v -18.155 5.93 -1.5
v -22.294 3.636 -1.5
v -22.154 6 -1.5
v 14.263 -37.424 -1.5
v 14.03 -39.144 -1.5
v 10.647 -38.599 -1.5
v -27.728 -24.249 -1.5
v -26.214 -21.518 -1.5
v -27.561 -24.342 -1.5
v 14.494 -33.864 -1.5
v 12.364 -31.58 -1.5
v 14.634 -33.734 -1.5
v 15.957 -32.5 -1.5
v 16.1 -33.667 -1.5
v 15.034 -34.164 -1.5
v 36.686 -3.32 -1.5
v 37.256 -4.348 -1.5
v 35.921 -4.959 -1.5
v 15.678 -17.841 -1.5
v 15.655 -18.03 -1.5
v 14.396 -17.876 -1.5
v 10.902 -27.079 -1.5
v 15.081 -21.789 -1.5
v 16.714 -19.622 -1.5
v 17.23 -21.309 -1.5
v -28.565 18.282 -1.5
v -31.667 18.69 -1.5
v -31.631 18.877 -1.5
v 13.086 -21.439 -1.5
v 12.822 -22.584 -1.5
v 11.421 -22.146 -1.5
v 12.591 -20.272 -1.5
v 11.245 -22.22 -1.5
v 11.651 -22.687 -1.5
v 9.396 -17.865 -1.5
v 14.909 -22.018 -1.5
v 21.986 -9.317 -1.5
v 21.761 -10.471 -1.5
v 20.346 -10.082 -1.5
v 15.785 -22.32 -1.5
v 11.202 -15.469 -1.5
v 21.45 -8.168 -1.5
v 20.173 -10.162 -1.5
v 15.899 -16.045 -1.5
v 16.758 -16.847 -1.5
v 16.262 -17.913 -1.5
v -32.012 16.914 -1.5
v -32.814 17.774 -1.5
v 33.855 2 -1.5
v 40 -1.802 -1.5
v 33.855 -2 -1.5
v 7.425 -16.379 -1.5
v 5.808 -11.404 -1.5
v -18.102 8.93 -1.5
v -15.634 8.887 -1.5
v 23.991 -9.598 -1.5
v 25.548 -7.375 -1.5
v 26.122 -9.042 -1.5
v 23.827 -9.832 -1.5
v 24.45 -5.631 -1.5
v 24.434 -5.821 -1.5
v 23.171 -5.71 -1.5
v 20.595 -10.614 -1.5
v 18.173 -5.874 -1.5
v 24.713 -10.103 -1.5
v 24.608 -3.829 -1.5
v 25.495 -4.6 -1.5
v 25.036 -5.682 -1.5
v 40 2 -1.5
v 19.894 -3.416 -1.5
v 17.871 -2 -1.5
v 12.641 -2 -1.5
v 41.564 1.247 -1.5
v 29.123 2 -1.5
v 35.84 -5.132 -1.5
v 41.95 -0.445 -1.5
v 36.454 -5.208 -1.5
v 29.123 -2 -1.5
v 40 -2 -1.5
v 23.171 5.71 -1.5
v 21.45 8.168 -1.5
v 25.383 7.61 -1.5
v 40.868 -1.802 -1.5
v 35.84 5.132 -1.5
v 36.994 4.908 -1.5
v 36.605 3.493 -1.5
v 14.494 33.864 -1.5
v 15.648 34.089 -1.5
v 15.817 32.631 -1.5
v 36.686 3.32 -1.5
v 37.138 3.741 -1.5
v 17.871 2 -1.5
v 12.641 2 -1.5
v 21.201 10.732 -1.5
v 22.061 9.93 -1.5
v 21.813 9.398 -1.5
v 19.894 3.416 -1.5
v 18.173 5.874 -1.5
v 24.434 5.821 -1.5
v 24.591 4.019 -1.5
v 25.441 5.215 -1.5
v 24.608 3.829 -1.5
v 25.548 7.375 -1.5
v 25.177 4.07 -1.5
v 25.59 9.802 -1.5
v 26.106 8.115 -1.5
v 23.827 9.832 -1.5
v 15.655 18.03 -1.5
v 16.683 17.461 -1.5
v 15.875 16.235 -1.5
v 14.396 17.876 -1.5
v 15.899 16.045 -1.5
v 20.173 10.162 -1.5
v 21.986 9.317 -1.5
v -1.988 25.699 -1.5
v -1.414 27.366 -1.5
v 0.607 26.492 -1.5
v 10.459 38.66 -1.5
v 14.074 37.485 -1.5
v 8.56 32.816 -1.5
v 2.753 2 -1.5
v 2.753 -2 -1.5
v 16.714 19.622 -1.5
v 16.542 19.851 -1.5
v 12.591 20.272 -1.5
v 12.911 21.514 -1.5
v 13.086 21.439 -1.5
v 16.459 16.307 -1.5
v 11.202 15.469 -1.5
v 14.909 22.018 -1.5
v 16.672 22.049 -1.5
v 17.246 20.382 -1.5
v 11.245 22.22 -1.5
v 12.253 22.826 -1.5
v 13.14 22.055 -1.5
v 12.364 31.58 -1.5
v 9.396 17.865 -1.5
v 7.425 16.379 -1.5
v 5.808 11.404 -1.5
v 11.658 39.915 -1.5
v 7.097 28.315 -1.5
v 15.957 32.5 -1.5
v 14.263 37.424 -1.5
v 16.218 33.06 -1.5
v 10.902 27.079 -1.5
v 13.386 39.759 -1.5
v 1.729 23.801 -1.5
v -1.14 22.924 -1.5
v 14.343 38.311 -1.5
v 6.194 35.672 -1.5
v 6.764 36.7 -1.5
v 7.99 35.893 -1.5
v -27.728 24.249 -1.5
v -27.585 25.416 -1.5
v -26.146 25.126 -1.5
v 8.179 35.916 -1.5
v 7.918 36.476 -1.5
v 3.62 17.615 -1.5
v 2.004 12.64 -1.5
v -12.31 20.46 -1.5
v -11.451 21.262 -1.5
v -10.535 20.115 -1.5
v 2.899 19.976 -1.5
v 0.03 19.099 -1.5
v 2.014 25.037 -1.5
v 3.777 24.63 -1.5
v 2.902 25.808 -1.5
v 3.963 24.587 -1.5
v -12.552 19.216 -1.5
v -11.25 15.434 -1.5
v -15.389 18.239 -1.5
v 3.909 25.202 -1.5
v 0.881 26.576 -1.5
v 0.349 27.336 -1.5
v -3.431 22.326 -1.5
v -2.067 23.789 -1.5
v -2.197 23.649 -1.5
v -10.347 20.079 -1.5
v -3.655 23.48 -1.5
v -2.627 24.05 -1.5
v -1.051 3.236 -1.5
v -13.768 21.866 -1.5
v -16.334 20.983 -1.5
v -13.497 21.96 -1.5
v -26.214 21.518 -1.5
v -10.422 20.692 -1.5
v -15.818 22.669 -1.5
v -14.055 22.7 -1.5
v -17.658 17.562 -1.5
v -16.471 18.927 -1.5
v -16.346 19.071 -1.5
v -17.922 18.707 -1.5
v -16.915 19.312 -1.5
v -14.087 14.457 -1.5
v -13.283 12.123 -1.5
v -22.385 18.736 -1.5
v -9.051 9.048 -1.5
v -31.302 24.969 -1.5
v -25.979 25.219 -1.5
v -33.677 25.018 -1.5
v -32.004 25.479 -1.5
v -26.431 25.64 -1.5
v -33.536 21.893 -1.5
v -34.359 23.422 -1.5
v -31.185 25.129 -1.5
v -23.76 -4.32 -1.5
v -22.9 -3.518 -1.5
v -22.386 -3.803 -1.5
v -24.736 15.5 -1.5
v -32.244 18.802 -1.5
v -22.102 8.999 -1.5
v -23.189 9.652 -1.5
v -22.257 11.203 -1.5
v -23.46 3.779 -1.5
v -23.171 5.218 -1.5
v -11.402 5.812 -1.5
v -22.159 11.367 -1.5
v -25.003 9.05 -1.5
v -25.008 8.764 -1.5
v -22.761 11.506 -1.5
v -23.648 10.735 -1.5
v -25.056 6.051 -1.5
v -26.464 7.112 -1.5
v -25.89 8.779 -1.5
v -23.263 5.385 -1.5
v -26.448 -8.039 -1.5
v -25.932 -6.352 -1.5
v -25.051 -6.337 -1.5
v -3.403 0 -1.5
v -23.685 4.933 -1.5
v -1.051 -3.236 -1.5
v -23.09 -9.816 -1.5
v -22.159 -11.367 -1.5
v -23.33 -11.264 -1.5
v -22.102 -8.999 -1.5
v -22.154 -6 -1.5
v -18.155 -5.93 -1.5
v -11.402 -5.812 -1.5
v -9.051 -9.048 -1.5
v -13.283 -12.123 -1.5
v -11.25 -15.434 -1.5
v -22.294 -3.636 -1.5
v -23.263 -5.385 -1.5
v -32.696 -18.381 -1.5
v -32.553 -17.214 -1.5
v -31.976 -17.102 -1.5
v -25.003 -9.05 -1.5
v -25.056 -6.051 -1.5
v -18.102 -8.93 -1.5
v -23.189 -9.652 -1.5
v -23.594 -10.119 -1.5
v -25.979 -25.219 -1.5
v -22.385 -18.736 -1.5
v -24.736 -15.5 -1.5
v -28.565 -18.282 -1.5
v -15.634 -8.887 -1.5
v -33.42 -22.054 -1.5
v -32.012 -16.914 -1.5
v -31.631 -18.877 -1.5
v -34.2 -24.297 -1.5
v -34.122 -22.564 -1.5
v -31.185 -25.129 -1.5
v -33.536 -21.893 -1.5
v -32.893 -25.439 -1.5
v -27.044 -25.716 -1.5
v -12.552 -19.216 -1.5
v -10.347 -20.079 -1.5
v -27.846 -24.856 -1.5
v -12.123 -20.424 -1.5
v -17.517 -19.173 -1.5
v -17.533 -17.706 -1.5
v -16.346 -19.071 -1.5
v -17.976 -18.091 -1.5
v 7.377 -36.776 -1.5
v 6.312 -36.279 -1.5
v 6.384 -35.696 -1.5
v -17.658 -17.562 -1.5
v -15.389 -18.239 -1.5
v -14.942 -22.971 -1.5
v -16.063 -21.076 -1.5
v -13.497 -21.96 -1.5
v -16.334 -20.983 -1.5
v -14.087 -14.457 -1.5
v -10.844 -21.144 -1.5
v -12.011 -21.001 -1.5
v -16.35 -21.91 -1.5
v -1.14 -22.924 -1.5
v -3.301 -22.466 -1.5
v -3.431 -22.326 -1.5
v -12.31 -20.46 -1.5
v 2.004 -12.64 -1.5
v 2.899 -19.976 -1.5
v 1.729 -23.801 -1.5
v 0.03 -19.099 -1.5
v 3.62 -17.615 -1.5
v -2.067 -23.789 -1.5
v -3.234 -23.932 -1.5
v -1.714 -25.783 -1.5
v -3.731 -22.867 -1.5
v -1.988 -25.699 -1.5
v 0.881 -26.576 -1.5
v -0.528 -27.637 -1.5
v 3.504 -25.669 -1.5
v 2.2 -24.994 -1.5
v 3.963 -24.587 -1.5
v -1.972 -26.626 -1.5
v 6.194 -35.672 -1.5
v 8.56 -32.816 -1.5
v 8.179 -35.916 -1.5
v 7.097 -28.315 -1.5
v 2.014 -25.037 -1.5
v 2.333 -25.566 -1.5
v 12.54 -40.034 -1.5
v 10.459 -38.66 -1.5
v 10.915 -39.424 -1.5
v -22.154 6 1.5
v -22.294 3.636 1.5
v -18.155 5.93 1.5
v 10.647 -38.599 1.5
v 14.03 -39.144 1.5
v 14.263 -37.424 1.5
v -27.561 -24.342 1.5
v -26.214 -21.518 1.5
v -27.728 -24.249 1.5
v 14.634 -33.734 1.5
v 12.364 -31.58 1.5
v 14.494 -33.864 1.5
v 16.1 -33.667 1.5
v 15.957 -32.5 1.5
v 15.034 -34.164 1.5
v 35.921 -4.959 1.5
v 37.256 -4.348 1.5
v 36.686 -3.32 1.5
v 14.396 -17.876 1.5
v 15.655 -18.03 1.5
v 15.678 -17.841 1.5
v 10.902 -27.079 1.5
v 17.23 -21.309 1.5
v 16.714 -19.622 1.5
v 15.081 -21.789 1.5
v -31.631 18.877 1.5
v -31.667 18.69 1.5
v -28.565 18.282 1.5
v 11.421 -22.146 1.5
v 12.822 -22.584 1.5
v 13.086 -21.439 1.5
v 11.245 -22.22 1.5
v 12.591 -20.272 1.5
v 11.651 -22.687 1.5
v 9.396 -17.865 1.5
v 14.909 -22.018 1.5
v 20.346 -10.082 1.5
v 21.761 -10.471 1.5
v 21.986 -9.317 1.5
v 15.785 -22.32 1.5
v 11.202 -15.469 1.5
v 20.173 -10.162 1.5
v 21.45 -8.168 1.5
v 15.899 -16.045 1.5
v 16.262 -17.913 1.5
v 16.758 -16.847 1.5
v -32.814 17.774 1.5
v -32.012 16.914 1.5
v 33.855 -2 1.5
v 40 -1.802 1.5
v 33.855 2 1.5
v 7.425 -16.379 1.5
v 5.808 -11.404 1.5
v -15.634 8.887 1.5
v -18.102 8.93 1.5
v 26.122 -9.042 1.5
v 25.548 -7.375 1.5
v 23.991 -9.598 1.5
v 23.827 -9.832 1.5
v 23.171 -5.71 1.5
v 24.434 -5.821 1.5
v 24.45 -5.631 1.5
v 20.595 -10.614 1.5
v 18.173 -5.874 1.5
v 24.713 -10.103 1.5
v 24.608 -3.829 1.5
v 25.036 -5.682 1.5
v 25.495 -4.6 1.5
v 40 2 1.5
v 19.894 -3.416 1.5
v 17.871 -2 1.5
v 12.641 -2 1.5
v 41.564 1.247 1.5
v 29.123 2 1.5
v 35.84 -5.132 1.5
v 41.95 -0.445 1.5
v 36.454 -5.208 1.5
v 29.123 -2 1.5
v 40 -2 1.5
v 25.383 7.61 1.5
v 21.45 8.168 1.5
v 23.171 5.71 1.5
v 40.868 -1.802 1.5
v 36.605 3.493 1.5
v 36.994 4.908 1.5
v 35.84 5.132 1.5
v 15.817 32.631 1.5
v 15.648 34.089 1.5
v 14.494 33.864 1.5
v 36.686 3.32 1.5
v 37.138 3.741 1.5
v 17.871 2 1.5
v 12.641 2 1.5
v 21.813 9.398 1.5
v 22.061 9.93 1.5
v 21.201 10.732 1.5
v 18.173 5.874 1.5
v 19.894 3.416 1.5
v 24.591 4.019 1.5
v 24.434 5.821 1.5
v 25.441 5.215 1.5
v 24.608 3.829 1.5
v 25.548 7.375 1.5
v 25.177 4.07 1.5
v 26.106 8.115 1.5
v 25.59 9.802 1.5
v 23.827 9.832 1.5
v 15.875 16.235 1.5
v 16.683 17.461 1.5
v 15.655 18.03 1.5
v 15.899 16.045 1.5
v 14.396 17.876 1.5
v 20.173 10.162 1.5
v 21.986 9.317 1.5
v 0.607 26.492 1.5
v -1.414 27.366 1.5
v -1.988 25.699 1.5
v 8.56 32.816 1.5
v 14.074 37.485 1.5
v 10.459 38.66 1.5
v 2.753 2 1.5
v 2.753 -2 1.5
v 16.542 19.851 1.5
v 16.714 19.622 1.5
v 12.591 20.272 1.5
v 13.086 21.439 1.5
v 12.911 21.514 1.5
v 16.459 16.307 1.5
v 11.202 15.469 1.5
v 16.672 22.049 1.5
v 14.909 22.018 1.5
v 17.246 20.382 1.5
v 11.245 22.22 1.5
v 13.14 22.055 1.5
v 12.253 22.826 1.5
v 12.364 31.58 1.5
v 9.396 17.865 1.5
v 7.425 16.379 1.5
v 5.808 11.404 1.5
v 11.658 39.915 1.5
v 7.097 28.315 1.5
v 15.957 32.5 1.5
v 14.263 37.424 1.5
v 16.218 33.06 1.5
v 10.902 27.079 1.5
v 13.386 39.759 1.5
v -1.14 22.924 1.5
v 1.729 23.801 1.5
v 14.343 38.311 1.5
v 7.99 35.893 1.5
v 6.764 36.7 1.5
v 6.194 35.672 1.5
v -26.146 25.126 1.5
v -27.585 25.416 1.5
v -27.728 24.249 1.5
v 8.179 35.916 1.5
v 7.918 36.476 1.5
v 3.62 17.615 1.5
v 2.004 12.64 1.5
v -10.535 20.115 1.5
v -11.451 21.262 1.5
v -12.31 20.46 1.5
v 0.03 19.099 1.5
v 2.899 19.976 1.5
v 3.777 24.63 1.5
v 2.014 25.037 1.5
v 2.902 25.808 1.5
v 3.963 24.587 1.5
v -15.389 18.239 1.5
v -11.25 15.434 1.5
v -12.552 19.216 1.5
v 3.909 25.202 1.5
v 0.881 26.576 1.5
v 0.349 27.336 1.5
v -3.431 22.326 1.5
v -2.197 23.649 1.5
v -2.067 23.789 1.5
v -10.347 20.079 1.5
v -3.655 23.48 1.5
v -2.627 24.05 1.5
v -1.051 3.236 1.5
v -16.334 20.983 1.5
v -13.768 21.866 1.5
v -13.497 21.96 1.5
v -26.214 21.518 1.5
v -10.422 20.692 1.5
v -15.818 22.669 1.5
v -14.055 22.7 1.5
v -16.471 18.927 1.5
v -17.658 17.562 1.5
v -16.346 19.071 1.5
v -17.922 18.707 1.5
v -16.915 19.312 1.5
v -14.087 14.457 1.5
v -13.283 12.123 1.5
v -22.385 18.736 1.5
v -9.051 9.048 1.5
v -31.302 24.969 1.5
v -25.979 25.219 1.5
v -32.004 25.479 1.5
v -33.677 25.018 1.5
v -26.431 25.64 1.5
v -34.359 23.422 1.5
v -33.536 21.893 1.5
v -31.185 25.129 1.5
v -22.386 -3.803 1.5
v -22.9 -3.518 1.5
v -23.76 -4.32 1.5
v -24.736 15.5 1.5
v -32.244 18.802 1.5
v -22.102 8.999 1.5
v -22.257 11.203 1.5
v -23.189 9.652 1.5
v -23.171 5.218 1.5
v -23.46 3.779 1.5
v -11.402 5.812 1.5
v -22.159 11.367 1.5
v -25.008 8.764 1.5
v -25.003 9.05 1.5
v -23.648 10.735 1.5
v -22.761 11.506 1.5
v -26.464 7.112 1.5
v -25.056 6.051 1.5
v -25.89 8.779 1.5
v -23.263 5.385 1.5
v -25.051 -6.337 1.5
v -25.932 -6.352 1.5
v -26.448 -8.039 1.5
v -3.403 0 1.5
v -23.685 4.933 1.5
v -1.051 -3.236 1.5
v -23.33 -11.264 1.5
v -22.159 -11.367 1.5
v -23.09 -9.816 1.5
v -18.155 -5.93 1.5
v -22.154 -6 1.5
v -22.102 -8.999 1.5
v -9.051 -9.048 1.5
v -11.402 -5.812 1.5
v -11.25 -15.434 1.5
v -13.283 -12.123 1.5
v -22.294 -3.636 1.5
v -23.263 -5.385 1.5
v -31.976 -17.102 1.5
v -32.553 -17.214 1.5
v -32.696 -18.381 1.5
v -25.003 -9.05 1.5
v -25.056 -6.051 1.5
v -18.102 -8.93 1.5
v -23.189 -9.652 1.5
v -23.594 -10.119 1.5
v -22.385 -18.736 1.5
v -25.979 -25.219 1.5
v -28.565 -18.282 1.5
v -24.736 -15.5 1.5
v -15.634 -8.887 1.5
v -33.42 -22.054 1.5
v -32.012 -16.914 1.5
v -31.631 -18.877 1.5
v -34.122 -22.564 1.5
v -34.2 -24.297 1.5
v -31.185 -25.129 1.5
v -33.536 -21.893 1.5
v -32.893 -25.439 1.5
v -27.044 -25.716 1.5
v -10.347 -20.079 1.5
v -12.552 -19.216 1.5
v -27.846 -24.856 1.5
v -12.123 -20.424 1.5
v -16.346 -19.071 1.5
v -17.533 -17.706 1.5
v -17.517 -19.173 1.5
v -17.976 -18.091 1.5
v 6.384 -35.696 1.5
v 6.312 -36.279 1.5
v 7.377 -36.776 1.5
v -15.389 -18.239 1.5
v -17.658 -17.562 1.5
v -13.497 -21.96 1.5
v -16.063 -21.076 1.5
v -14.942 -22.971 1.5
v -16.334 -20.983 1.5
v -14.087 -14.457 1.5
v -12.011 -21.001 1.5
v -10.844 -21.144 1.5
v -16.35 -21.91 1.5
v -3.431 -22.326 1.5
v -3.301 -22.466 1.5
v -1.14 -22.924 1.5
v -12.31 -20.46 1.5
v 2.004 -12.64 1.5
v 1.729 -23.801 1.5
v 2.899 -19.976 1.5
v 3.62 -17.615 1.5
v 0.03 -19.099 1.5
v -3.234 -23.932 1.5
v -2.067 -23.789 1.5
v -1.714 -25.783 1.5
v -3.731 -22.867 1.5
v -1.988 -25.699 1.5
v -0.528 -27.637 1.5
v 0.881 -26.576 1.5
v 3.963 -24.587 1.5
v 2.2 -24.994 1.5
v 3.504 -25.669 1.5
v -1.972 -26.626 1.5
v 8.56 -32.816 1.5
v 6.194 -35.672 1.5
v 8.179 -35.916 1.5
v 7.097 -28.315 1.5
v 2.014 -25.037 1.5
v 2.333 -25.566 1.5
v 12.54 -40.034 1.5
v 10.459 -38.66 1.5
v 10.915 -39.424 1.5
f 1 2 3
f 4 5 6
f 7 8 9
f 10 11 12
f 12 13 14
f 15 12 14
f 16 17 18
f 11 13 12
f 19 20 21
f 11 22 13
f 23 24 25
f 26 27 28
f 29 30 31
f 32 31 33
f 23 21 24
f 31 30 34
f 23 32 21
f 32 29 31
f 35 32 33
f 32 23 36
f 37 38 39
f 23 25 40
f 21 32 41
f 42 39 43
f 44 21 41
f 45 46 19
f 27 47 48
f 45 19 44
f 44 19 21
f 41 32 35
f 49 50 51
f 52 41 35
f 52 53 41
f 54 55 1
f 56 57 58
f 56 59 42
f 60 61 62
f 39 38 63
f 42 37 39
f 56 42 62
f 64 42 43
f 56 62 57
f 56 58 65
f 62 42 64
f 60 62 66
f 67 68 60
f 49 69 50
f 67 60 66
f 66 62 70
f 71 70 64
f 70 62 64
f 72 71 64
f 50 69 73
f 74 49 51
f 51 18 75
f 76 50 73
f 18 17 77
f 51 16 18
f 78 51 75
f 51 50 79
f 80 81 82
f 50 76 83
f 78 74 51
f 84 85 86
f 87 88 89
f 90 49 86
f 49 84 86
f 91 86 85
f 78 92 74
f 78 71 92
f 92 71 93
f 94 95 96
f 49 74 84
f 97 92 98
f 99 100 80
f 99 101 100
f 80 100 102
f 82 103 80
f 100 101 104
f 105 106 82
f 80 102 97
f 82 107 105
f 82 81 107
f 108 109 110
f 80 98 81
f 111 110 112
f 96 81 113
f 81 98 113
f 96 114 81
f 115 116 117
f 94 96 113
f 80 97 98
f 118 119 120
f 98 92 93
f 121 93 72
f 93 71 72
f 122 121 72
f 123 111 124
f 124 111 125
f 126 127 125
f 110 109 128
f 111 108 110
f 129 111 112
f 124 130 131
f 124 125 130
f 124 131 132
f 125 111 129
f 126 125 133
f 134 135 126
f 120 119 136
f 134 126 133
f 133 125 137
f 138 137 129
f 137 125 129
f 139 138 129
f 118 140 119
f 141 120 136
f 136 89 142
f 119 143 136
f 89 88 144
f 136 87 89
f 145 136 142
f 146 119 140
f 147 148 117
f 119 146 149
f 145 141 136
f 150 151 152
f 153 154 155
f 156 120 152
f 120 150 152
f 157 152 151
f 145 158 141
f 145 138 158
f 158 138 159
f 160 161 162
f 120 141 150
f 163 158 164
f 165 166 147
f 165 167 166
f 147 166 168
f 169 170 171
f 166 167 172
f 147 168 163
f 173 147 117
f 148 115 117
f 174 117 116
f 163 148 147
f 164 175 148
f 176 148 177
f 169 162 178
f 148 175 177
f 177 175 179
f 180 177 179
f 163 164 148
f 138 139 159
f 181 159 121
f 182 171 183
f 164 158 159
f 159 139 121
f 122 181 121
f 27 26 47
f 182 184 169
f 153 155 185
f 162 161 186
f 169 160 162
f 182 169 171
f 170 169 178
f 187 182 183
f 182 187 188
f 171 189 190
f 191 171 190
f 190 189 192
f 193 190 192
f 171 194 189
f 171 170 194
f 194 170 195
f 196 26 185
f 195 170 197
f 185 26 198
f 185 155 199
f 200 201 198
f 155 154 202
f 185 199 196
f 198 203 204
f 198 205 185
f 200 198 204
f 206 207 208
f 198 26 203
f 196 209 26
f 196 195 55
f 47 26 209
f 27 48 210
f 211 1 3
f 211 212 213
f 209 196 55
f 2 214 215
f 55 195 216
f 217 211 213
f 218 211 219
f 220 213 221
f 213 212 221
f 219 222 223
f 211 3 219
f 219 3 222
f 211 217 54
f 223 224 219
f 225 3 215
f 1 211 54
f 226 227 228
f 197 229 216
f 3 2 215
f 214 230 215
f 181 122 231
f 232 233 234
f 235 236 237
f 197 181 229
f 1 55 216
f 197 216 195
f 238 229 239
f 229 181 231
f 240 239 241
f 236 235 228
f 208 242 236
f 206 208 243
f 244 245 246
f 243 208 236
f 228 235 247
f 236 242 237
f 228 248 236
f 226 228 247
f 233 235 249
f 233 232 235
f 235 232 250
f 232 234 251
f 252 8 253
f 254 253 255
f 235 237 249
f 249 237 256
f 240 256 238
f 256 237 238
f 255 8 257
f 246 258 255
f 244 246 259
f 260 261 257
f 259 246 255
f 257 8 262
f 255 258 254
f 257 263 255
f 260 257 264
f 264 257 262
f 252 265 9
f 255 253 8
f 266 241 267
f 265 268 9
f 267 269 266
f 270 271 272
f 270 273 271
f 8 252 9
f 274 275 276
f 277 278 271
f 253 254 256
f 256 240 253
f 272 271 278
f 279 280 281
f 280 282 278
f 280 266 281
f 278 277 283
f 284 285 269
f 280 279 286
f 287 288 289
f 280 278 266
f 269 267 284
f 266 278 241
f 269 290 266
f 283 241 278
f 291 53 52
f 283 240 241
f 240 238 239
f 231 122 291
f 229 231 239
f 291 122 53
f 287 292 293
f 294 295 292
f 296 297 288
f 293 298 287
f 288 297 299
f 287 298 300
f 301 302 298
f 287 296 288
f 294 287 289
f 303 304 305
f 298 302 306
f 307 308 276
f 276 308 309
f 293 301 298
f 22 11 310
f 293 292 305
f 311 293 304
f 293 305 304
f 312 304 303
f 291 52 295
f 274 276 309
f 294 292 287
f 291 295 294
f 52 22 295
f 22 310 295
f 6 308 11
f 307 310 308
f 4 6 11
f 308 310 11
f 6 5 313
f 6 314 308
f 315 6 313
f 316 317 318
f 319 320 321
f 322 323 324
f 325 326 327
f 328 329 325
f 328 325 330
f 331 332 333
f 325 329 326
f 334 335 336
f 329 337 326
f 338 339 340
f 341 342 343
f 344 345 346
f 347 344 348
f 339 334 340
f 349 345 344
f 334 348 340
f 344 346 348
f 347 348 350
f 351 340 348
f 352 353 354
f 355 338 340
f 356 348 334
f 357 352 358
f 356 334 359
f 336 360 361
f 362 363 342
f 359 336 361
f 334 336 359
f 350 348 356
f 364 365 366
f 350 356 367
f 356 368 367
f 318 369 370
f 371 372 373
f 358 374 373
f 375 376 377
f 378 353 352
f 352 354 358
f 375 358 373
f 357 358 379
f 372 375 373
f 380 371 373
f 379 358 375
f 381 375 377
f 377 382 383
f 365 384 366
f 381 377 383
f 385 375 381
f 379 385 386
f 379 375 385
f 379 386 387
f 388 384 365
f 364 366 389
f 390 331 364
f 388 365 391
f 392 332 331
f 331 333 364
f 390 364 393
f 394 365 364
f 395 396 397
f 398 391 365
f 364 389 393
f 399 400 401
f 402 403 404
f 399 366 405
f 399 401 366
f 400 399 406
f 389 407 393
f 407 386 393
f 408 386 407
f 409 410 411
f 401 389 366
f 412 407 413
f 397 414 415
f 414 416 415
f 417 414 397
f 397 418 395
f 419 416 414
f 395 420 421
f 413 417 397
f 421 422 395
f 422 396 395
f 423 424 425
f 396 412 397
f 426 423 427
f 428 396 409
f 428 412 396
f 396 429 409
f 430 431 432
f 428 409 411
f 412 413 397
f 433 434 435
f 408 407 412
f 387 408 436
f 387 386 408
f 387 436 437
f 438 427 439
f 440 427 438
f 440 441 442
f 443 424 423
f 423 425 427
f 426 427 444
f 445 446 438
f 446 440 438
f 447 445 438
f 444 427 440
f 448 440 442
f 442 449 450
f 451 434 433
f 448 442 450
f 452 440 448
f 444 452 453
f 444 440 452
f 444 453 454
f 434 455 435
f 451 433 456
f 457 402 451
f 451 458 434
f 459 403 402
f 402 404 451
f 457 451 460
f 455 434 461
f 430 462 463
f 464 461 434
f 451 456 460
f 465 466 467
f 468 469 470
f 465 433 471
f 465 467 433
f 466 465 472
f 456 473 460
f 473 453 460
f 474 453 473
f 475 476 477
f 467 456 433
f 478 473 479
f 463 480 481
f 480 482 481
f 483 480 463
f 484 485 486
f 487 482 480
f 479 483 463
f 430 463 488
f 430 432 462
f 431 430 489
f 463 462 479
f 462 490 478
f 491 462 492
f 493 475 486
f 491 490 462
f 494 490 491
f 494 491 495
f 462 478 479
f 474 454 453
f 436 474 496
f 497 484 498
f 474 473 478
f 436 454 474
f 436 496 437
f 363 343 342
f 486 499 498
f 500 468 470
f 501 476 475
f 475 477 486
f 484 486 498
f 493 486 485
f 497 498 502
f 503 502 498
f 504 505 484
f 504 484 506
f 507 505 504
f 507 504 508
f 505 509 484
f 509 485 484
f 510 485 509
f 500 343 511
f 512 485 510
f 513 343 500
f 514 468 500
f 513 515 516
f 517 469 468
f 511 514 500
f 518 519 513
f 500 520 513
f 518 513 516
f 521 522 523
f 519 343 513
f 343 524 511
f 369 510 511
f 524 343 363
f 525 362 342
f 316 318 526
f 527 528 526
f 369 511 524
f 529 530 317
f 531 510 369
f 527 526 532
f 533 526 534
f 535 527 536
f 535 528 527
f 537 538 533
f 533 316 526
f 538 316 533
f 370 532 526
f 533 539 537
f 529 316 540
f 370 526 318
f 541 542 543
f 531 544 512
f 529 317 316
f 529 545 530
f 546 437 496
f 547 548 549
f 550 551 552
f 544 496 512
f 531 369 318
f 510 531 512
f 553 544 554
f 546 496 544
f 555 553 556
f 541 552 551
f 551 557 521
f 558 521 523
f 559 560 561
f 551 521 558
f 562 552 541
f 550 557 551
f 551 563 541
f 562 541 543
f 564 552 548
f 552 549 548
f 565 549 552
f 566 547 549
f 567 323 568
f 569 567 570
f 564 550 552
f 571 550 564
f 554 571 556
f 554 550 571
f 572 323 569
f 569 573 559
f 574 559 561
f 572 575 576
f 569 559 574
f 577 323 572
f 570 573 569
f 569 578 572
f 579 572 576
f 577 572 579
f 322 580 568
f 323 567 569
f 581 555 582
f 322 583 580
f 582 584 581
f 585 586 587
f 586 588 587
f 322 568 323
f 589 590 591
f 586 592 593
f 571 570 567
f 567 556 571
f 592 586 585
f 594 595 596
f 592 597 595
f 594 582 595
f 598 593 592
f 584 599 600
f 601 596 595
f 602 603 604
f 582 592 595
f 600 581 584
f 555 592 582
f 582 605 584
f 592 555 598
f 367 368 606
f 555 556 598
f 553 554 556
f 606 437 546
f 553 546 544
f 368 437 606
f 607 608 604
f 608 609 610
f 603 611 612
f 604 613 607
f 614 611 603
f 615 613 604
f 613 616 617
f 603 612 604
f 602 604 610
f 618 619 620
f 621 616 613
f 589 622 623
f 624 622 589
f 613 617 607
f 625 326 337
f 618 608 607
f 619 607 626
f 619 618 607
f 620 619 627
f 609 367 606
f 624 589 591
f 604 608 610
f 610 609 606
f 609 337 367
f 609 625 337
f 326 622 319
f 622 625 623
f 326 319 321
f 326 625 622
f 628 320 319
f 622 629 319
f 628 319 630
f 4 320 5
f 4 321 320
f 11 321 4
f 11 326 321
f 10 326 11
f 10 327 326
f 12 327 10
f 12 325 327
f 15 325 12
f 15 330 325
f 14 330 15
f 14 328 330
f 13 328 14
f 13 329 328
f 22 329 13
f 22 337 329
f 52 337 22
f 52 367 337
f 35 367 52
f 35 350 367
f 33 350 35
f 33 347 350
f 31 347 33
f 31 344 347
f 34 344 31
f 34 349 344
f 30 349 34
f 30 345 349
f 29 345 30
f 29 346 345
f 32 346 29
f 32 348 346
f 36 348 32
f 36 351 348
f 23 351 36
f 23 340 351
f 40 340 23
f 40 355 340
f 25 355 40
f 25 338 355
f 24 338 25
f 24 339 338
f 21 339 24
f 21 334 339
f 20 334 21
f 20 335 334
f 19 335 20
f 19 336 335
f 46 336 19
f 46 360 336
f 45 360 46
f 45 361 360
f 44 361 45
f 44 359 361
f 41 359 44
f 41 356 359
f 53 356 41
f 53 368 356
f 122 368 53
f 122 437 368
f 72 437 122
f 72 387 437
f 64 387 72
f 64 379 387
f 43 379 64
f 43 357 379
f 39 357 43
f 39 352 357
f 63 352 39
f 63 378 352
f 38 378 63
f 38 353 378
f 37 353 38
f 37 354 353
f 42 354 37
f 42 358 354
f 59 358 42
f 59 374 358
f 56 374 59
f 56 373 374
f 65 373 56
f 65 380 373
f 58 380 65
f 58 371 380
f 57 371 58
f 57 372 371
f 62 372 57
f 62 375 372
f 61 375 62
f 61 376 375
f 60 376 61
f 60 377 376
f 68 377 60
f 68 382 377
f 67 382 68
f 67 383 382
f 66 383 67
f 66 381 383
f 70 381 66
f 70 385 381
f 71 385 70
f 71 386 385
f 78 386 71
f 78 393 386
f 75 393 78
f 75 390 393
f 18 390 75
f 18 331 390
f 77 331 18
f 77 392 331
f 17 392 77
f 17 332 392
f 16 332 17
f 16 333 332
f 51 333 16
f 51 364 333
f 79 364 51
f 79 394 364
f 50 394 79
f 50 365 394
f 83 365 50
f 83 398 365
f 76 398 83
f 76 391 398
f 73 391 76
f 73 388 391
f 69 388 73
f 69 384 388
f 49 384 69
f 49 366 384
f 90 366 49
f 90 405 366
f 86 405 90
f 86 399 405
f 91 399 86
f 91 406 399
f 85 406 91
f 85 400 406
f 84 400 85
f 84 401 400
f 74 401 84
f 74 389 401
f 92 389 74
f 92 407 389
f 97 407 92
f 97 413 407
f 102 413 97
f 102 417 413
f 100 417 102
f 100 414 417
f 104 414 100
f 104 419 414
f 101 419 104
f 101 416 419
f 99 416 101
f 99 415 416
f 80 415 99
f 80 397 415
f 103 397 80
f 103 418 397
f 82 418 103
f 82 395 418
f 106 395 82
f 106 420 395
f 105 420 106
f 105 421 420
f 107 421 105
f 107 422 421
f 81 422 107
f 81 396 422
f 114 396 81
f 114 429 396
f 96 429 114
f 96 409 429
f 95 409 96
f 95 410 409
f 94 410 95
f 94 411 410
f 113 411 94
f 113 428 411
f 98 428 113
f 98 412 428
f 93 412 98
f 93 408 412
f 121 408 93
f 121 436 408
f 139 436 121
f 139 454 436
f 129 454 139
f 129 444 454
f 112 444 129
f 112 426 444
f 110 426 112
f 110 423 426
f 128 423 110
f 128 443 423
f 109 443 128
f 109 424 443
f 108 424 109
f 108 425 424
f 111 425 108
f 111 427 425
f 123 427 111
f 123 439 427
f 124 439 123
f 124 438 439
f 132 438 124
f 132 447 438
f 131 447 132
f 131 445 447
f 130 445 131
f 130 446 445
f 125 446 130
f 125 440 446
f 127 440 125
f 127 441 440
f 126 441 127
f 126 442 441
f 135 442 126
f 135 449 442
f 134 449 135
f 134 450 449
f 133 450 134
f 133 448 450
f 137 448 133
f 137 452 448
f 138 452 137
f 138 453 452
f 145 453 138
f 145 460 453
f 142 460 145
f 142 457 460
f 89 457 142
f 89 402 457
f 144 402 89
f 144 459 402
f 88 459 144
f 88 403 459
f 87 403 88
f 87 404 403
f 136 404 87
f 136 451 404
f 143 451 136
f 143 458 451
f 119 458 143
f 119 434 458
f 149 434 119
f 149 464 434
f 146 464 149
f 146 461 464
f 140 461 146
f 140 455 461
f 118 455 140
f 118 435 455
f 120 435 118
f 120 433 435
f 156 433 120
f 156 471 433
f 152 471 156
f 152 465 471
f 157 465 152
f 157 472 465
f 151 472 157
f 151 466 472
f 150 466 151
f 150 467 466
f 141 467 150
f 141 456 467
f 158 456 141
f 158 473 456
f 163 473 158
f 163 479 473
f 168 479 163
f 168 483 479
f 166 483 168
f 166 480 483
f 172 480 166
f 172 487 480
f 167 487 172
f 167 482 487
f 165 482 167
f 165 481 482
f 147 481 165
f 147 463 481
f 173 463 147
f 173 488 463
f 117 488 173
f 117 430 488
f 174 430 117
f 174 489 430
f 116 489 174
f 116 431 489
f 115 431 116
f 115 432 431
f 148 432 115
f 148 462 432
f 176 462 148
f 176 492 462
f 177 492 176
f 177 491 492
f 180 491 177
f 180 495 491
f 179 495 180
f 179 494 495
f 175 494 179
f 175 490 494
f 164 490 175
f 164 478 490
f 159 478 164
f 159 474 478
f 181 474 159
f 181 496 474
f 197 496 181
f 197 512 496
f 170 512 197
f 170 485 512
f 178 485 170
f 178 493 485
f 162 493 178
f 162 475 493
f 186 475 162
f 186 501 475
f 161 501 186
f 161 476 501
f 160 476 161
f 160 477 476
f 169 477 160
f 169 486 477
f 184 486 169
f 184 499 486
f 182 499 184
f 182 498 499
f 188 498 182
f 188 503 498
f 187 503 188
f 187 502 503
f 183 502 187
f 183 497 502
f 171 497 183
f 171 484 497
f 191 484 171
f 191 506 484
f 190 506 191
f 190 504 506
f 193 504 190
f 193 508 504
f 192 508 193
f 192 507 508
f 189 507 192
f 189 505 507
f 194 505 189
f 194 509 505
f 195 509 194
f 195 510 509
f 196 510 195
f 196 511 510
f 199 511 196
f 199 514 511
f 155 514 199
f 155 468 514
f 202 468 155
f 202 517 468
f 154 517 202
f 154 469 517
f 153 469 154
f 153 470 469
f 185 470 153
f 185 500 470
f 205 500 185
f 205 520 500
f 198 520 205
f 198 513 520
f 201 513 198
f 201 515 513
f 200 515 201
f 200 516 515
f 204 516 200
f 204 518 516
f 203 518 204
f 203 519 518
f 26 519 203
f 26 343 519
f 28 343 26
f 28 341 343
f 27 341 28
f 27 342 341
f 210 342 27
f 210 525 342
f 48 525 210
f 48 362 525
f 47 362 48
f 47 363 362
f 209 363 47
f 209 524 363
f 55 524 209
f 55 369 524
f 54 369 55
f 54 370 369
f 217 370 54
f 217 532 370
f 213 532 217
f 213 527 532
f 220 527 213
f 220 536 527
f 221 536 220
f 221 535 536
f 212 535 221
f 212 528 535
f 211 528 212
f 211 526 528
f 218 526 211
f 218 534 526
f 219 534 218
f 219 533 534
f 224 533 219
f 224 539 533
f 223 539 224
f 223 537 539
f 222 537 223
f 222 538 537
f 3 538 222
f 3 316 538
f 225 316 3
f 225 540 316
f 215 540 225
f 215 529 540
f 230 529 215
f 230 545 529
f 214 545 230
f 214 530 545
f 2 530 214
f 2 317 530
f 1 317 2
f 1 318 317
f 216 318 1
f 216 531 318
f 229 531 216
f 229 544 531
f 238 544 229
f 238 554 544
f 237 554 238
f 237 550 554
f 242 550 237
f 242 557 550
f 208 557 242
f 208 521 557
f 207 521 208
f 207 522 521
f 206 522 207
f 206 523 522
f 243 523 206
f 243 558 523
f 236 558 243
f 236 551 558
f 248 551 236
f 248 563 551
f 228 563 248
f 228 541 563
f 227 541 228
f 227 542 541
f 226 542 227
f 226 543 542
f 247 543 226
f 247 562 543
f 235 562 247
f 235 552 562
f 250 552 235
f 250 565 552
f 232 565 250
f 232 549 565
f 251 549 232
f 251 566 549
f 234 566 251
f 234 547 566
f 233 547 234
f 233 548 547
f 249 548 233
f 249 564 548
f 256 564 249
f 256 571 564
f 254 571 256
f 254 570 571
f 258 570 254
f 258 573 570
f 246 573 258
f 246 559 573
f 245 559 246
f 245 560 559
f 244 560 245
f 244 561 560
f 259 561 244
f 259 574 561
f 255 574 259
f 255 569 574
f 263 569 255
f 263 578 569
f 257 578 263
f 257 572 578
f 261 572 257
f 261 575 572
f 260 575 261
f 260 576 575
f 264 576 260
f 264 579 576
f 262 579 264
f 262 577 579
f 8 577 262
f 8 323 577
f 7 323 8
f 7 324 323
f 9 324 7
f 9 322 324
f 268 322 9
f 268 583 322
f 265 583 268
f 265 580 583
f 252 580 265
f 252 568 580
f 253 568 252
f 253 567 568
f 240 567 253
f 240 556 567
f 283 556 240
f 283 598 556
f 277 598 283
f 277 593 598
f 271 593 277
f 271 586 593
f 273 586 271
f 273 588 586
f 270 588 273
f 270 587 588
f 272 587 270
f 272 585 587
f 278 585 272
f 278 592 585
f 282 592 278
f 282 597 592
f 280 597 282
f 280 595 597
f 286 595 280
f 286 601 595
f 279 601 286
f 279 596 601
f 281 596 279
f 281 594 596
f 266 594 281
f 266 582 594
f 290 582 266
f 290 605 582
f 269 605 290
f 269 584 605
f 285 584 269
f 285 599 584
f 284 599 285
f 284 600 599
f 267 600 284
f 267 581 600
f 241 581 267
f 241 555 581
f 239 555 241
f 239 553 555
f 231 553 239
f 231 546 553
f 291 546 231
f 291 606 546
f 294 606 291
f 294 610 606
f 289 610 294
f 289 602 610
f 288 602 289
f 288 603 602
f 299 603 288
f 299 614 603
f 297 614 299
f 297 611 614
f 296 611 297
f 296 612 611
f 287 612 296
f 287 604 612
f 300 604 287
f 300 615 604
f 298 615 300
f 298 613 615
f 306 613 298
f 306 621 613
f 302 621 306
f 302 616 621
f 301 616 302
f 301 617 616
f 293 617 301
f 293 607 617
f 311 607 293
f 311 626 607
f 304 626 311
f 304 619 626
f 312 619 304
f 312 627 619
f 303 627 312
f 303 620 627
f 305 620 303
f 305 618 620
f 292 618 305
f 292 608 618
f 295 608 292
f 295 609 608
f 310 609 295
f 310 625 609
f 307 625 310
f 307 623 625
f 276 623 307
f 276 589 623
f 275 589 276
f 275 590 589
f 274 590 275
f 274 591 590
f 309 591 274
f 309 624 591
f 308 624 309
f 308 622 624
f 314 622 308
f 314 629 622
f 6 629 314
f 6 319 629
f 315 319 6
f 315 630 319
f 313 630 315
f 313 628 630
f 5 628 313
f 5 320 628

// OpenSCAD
// ============================
// PARAMETRI
// ============================
points = 5;                  // broj glavnih krakova (fiksno)
main_len = 40;               // duljina glavne grane
main_thick = 4;              // debljina glavne grane
height_3d = 3;               // stvarna debljina pahuljice u Z

rows = 2;                    // broj redova podgrana

// parametri podgrana po redu
sub_lengths = [15,10];       // duljina podgrana
sub_angles = [35,25];        // kut podgrana
sub_thicks = [3,2];          // debljina podgrana

// offseti prvog i drugog reda (0..1, precizno po 0.01)
sub_offset1 = 0.31;  
sub_offset2 = 0.68;  

// parametri malih podgrana prvog reda
inner_sub_count = 2;         // broj malih podgrana po podgrani prvog reda
inner_sub_length = 6;        // duljina malih podgrana
inner_sub_angle = 30;        // kut malih podgrana
inner_sub_thick = 2;         // debljina malih podgrana

// polumjer zaobljenja vrhova
cap_radius = 2;

// ============================
// MODULI
// ============================
module line2d_rounded(len, thick) {
    union() {
        translate([0,-thick/2])
            square([len, thick]);
        translate([len,0])
            rotate([0,0,90])
                circle(r=thick/2);
    }
}

module inner_subs() {
    for(i=[-floor(inner_sub_count/2):floor(inner_sub_count/2)]) {
        if(i != 0) {
            rot = i * inner_sub_angle / max(1, floor(inner_sub_count/2));
            rotate([0,0,rot])
                line2d_rounded(inner_sub_length, inner_sub_thick);
        }
    }
}

module first_row_subbranch(len, thick, angle) {
    rotate([0,0,angle]) {
        line2d_rounded(len, thick);
        translate([len/2,0]) inner_subs();
    }
}

module subbranch(len, thick, angle) {
    rotate([0,0,angle])
        line2d_rounded(len, thick);
}

module branch2d() {
    union() {
        line2d_rounded(main_len, main_thick);

        for(row=[0:rows-1]) {
            if(row==0) {
                translate([main_len*sub_offset1,0])
                    first_row_subbranch(sub_lengths[row], sub_thicks[row], sub_angles[row]);
                translate([main_len*sub_offset1,0])
                    first_row_subbranch(sub_lengths[row], sub_thicks[row], -sub_angles[row]);
            } else {
                translate([main_len*sub_offset2,0])
                    subbranch(sub_lengths[row], sub_thicks[row], sub_angles[row]);
                translate([main_len*sub_offset2,0])
                    subbranch(sub_lengths[row], sub_thicks[row], -sub_angles[row]);
            }
        }
    }
}

// ============================
// 3D Pahuljica
// ============================
linear_extrude(height=height_3d, center=true) {
    union() {
        for(i=[0:points-1])
            rotate(i*360/points)
                branch2d();
    }
}
